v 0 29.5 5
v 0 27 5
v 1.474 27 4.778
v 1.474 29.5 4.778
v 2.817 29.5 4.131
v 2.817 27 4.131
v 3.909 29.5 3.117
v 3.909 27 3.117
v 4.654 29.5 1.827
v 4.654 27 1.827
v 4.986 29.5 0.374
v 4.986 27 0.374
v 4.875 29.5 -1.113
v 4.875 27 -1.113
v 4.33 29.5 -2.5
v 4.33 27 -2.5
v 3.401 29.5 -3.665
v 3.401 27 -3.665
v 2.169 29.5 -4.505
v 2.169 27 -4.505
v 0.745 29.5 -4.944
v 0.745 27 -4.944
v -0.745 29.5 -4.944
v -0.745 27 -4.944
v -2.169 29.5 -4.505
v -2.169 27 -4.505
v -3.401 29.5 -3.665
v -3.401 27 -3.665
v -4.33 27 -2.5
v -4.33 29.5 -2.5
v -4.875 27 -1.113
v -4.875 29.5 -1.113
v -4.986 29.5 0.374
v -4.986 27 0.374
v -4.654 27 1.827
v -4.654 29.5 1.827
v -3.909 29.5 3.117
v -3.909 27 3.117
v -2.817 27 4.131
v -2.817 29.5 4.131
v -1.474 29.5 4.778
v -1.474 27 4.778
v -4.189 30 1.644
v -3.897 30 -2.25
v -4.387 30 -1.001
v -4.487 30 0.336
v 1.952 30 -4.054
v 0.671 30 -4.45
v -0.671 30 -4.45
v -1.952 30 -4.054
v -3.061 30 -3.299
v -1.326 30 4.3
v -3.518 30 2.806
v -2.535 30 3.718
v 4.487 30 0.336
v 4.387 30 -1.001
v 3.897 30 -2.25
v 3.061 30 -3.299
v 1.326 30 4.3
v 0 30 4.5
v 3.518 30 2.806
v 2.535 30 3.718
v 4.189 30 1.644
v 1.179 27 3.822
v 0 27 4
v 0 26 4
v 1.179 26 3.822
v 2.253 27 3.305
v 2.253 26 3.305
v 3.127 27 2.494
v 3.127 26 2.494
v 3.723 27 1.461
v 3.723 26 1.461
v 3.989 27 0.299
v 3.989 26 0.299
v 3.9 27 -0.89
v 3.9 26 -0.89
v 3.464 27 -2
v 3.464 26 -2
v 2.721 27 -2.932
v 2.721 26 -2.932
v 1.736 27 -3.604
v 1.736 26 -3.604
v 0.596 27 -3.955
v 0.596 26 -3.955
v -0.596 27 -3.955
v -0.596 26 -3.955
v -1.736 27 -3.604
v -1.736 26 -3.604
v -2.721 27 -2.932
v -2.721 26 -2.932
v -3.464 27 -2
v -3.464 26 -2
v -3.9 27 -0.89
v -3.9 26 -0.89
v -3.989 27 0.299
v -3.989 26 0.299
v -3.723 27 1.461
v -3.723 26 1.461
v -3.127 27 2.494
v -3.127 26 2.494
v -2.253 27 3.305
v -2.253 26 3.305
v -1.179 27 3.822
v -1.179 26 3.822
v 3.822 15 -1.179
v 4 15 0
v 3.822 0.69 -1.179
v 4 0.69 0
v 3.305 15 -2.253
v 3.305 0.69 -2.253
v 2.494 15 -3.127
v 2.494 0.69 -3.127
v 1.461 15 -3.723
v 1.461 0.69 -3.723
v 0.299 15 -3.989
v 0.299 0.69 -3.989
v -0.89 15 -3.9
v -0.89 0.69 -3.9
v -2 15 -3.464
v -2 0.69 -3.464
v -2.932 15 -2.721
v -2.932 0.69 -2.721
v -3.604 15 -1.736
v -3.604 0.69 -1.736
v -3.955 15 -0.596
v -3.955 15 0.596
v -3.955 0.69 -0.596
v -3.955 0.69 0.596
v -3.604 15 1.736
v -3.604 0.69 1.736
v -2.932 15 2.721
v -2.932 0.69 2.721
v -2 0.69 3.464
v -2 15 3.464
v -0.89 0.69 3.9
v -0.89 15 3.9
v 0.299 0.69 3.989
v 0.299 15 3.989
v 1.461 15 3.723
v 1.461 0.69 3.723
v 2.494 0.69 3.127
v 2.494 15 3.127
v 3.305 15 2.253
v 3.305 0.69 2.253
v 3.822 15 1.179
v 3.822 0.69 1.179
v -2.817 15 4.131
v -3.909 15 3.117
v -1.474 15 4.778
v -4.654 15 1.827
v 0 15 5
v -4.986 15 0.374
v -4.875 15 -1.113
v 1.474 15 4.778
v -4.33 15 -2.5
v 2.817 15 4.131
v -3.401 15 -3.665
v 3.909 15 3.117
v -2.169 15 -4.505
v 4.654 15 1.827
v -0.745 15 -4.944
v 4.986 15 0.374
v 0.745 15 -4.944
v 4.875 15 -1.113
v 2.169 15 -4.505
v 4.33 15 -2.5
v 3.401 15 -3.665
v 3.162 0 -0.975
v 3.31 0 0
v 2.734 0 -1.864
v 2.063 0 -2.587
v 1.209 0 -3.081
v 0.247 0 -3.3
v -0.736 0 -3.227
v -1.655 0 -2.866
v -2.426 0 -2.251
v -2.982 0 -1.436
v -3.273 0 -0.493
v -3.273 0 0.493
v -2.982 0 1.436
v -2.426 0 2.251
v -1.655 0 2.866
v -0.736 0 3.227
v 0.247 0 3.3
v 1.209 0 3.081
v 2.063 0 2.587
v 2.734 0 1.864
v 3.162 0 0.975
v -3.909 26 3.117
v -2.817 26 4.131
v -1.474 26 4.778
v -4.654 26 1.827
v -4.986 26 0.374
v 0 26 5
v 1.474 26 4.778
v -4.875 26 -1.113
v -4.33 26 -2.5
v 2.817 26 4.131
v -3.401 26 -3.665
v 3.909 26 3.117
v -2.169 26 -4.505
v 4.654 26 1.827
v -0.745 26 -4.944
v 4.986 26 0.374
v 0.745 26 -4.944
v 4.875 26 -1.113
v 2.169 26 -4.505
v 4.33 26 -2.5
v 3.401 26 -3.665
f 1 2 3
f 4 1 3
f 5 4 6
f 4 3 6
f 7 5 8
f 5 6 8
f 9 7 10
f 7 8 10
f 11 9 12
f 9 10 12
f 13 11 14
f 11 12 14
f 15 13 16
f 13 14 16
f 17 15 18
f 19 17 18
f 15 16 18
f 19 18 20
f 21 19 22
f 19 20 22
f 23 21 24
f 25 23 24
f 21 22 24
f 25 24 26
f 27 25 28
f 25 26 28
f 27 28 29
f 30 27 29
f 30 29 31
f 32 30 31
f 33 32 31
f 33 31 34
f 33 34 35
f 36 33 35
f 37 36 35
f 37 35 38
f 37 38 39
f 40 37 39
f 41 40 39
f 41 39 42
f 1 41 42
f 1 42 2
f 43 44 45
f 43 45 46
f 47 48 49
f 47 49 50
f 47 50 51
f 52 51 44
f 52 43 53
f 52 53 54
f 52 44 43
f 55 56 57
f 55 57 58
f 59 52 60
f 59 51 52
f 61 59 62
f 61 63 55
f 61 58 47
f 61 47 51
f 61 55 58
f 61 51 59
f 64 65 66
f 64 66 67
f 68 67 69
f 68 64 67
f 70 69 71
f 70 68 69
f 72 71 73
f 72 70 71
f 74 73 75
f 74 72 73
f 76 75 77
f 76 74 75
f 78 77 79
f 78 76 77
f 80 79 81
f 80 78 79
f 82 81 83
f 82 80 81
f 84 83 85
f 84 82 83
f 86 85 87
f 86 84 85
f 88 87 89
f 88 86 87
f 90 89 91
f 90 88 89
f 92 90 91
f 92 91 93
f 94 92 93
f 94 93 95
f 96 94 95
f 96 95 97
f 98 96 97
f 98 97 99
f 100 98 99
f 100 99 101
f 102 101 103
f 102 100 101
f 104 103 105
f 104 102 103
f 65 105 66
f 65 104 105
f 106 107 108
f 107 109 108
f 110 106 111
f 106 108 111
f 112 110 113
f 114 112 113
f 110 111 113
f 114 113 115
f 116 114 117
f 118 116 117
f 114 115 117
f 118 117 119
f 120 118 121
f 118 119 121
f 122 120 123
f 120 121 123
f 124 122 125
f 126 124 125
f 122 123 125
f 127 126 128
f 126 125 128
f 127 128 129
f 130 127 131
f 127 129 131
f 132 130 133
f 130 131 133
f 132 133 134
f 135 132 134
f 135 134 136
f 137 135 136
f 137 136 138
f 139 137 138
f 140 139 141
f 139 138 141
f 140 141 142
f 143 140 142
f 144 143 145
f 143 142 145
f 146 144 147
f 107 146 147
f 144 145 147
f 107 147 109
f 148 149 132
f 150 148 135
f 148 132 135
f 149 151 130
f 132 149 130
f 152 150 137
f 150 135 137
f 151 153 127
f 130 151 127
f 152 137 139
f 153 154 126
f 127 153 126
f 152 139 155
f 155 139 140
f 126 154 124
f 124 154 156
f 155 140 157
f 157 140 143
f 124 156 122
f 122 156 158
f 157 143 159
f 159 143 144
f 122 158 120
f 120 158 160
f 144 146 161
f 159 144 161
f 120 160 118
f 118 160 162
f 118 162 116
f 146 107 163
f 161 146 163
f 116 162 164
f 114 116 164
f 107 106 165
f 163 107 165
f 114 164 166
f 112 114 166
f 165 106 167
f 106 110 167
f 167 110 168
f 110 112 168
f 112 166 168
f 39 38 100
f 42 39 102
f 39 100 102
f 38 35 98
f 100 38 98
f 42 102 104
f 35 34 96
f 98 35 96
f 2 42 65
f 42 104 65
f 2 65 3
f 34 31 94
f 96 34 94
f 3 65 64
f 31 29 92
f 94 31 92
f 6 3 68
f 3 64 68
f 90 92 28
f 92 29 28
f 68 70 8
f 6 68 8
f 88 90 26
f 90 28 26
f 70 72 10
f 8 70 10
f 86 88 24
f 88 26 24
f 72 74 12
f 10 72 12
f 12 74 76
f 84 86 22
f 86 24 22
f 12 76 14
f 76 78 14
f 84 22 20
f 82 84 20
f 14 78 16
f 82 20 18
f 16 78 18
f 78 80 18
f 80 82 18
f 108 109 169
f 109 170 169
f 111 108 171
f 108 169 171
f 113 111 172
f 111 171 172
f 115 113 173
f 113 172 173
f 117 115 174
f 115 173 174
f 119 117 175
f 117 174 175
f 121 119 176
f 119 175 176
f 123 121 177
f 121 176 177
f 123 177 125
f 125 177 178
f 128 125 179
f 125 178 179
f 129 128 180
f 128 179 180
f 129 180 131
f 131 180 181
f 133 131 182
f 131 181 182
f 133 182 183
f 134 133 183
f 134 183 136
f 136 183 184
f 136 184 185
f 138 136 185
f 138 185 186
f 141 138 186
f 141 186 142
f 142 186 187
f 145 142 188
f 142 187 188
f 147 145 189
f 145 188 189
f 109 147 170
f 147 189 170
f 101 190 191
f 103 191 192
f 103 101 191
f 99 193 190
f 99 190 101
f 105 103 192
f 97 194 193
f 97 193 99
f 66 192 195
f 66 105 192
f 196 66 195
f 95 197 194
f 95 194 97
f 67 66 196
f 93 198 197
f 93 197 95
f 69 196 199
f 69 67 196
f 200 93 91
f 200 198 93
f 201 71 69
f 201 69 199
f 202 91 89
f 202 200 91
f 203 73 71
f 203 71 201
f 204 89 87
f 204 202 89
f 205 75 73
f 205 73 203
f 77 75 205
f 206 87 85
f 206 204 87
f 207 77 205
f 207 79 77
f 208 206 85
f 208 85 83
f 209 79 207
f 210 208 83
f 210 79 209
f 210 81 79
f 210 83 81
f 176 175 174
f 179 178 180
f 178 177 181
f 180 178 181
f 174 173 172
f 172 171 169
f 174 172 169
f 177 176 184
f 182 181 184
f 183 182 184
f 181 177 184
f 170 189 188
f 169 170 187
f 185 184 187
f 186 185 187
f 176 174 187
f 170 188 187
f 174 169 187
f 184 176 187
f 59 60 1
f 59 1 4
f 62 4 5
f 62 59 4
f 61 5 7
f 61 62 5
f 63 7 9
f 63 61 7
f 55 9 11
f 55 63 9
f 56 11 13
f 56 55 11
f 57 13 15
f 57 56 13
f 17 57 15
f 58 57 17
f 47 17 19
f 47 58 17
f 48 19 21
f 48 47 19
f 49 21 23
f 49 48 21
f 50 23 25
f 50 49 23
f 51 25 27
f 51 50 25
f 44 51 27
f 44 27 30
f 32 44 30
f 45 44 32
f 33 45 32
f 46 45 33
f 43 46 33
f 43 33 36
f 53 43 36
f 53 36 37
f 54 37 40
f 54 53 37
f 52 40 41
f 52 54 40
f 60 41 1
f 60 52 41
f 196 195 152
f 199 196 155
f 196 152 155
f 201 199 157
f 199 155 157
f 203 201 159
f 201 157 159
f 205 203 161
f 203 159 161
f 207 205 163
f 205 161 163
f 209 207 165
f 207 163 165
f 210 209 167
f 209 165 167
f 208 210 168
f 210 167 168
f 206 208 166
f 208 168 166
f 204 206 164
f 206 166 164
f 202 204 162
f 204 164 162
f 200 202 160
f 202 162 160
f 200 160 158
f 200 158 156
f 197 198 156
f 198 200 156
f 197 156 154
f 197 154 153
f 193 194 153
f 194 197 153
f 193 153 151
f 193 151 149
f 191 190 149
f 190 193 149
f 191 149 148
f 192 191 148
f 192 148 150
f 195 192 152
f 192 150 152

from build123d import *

# Parameters (mm, degrees)
SKETCH1_R           = 5
BOSS_EXTRUDE1_DEPTH = 30
CHAMFER1_SIZE       = 0.5
CUT_EXTRUDE1_START  = -3
SKETCH2_R           = 6
SKETCH2_R_2         = 4
CUT_EXTRUDE1_DEPTH  = 1


# Read off the part's stored shape, not the designer's step: M8 Machine Threads Stud1
with BuildPart() as part:
    # Sketch1 → Boss-Extrude1 (new body)
    with BuildSketch(Plane(origin=(0, 0, 0), x_dir=(1, 0, 0), z_dir=(0, 1, 0))):
        with Locations(Location((0, 0, 0), (0, 0, 270))):
            Circle(SKETCH1_R)
    extrude(amount=BOSS_EXTRUDE1_DEPTH)

    # Chamfer1
    chamfer1_edges = [part.edges().sort_by_distance(p)[0] for p in [
        (0, 30, -5),
    ]]
    chamfer(chamfer1_edges, length=CHAMFER1_SIZE)

    # Sketch2 → Cut-Extrude1 (cut)
    with BuildSketch(Plane(origin=(0, 30, 0), x_dir=(1, 0, 0), z_dir=(0, 1, 0)).offset(CUT_EXTRUDE1_START)):
        Circle(SKETCH2_R)
        with Locations(Location((0, 0, 0), (0, 0, 270))):
            Circle(SKETCH2_R_2, mode=Mode.SUBTRACT)
    extrude(amount=-CUT_EXTRUDE1_DEPTH, mode=Mode.SUBTRACT)

    # M8 Machine Threads Stud1 outline → M8 Machine Threads Stud1 (revolve, cut)
    with BuildSketch(Plane.XY):
        Polygon((3.3095, 0), (5, 0), (5, 15), (4, 15), (4, 0.6905), align=None)
    revolve(axis=Axis((0, 0, 0), (0, 1, 0)), mode=Mode.SUBTRACT)


solid = part.part
